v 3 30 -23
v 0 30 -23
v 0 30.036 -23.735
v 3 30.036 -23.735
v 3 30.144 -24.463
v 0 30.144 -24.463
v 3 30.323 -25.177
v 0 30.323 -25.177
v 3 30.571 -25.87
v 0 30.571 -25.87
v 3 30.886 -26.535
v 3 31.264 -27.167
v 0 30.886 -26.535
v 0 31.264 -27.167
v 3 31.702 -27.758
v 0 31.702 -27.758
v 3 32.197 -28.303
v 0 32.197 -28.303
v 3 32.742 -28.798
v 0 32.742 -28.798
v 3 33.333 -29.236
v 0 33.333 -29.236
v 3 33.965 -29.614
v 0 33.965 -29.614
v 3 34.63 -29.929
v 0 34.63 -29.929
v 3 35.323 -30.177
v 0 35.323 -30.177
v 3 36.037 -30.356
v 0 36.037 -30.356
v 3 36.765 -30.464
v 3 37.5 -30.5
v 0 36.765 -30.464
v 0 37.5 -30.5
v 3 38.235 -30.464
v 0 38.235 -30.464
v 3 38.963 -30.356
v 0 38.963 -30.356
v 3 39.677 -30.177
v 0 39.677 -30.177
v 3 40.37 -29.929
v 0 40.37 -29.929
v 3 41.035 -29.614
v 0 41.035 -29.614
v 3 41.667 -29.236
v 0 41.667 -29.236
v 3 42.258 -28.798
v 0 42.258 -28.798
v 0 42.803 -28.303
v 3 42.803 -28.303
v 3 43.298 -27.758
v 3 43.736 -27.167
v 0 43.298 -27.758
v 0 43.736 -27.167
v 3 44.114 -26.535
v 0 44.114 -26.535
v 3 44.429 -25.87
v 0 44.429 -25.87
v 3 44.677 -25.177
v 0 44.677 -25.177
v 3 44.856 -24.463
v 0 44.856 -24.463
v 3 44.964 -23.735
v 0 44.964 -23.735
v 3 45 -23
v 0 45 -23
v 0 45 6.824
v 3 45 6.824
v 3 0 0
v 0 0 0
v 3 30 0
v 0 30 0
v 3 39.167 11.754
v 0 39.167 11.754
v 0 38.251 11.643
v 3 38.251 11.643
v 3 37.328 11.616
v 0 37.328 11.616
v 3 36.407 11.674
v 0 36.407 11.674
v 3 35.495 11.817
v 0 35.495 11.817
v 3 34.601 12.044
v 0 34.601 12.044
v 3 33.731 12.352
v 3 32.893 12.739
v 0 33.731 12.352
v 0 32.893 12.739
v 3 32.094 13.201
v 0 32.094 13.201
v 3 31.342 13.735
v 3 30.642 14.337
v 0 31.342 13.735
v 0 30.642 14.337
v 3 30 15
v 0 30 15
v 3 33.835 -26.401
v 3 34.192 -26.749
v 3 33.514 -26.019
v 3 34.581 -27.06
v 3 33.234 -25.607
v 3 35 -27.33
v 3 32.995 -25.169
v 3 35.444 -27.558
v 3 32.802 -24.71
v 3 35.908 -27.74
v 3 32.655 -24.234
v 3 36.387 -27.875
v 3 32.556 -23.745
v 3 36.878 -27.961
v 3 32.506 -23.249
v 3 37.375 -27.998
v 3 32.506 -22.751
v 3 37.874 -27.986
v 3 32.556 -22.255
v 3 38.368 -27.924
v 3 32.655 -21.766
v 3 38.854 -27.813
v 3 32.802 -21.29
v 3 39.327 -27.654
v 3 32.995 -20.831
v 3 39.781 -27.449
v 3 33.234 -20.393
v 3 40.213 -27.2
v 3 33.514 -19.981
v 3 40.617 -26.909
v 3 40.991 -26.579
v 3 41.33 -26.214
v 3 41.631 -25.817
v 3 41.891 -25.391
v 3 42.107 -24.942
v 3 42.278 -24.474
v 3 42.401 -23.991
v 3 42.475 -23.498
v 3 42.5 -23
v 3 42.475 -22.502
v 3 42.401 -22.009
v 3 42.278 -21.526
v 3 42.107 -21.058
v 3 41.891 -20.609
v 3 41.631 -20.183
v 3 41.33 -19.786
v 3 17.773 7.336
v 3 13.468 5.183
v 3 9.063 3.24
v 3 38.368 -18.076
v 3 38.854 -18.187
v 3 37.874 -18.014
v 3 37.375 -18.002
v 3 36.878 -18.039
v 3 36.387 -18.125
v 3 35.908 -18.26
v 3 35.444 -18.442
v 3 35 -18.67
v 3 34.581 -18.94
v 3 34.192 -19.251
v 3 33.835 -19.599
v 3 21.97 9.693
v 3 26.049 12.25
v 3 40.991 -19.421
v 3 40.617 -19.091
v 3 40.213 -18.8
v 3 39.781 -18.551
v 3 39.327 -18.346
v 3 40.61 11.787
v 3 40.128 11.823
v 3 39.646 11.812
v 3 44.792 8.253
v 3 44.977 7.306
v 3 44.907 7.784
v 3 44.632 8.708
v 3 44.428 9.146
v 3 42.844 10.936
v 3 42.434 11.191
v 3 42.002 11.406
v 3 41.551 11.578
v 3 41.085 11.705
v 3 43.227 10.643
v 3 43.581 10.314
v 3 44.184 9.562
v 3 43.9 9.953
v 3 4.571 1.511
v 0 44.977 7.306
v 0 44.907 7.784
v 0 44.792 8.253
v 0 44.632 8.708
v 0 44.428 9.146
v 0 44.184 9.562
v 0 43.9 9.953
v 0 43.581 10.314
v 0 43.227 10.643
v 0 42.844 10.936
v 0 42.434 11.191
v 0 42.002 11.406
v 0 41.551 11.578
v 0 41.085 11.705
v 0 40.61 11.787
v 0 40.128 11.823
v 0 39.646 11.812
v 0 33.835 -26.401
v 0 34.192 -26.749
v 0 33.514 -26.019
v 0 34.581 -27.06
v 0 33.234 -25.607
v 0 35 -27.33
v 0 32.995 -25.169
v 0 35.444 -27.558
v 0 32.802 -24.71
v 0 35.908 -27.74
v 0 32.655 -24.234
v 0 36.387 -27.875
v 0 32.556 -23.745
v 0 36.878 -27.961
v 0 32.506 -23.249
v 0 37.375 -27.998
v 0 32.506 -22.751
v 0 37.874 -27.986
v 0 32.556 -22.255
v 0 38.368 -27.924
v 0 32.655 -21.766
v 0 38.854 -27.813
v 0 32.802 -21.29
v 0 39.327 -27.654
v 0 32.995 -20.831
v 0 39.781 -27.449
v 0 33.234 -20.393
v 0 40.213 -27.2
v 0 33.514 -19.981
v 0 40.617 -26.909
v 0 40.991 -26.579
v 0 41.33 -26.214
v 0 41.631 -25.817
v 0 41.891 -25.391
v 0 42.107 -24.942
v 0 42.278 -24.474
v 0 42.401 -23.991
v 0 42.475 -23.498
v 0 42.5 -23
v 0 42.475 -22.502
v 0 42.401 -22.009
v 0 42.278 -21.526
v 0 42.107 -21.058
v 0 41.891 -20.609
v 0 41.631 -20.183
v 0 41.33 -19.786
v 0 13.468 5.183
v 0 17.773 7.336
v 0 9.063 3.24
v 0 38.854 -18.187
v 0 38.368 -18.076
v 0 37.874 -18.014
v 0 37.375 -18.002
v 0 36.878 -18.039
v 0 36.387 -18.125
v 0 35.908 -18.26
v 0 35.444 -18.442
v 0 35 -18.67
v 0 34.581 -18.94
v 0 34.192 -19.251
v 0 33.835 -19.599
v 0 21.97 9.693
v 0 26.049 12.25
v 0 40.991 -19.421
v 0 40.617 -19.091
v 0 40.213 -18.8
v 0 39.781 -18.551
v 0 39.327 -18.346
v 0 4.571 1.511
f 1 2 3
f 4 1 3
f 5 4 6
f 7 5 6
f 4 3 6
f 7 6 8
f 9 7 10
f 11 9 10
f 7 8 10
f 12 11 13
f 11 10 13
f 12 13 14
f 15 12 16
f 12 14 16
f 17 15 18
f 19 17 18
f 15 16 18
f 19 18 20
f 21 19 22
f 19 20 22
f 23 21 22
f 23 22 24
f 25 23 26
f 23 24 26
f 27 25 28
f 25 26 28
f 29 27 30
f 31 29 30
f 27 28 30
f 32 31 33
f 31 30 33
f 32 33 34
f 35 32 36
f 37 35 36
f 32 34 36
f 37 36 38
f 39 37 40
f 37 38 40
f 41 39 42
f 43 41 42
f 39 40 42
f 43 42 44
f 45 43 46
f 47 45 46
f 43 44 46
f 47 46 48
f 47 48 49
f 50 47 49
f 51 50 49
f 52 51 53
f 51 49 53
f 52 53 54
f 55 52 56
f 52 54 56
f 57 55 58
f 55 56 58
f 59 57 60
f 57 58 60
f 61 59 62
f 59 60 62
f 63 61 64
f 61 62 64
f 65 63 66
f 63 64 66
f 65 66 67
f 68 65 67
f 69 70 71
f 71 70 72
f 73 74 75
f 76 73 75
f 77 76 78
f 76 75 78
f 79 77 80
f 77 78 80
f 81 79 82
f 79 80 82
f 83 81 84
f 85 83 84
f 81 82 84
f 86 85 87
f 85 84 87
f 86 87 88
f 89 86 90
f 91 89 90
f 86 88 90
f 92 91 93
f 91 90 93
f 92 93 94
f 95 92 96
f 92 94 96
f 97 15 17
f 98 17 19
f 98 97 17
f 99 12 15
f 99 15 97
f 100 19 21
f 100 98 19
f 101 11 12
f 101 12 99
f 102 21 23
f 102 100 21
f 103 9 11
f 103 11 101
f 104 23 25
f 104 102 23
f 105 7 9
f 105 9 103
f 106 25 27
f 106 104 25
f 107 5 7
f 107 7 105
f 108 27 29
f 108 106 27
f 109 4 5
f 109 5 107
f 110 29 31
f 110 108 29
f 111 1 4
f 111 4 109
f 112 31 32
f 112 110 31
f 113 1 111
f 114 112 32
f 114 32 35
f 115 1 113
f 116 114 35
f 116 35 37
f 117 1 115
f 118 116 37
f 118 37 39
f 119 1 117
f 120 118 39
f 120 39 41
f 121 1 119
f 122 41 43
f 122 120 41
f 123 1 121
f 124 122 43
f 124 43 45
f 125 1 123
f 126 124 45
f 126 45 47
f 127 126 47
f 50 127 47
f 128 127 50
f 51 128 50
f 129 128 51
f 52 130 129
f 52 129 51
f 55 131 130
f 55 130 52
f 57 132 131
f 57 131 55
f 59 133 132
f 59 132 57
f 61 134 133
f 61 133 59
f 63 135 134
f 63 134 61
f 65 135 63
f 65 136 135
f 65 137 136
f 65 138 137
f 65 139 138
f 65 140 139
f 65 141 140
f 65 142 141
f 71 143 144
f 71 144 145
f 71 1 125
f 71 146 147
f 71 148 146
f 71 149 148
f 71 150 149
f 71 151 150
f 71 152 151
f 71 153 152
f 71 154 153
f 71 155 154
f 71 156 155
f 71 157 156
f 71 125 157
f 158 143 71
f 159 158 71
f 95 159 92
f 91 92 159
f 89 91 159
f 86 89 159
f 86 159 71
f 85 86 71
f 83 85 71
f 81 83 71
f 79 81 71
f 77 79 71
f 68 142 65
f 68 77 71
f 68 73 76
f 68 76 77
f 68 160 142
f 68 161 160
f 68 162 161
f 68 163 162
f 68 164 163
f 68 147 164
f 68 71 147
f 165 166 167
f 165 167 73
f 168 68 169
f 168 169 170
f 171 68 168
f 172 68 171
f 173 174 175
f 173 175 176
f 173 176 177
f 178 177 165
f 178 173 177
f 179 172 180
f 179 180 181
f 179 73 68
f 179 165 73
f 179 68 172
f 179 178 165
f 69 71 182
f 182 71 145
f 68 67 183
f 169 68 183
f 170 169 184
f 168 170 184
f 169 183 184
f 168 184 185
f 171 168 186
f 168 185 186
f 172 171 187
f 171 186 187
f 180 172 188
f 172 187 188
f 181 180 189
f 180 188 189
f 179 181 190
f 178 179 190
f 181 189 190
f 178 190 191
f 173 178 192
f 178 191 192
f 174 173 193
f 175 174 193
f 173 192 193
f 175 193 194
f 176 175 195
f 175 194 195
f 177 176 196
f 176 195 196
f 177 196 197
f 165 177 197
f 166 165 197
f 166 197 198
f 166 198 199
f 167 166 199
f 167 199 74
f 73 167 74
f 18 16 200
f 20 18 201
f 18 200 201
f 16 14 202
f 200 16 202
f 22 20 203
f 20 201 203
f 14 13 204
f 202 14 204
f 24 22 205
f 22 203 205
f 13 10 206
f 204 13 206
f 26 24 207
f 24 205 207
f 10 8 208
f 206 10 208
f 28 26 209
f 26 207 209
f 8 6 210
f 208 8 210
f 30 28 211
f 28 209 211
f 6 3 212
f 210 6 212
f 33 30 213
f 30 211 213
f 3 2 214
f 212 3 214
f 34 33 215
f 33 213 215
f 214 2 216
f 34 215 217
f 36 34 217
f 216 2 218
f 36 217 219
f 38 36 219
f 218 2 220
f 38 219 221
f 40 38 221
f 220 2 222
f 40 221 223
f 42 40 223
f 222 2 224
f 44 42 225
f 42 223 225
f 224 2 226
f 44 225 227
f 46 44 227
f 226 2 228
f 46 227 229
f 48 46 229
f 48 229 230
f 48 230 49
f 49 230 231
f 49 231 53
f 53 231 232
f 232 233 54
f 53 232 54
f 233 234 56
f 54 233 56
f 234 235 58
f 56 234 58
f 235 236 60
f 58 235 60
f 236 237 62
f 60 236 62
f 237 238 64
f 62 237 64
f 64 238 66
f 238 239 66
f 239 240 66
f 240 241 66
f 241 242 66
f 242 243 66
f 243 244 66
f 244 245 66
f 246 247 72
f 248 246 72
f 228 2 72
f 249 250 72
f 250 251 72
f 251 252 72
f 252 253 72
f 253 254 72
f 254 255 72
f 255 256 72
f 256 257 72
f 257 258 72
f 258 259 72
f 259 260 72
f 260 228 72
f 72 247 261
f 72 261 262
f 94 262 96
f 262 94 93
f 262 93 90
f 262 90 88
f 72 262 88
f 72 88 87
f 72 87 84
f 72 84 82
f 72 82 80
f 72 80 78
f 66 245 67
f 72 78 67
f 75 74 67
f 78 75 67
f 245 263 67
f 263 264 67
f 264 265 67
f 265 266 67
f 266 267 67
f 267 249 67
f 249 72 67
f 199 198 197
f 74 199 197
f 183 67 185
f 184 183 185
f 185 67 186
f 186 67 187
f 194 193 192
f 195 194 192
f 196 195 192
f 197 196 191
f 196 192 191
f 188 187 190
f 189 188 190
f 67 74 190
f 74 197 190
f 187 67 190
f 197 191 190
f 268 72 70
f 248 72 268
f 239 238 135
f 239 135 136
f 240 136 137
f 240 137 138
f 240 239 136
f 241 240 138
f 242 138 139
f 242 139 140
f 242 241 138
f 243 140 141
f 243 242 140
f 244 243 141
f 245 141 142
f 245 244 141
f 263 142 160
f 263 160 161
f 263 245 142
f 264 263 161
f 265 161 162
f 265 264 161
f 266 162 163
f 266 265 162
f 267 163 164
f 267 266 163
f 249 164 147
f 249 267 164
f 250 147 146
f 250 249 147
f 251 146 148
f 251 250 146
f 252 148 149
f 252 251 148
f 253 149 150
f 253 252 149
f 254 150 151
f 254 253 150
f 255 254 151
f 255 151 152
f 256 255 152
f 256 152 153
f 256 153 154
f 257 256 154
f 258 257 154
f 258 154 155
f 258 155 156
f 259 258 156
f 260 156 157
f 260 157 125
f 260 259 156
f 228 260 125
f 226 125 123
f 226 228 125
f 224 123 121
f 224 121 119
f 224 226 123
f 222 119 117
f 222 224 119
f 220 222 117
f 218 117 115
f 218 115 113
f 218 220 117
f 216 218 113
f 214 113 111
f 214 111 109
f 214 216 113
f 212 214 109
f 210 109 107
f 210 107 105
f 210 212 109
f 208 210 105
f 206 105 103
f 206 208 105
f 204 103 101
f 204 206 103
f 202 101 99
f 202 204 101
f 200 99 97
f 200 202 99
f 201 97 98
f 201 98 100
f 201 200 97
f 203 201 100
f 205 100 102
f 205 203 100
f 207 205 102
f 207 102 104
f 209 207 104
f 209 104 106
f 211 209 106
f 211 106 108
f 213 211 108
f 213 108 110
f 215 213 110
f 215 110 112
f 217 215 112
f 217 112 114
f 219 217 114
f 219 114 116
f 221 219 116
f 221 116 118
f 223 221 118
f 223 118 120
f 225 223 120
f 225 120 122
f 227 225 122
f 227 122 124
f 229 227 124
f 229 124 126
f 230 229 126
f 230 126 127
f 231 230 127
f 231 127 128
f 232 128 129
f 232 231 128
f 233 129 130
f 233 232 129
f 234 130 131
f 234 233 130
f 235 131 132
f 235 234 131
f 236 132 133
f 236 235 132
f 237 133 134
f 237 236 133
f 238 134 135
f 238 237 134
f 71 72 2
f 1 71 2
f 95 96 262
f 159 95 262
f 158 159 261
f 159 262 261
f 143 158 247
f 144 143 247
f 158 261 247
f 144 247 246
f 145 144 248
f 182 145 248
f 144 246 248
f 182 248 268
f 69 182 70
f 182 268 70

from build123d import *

# Parameters (mm, degrees)
F0_R     = 5
F1_DEPTH = 3


with BuildPart() as f1:
    # F0 (on Right) → F1 (new body)
    with BuildSketch(Plane.YZ):
        with BuildLine():
            ThreePointArc((30, 15), (15.633379, 6.233241), (0, 0))
            Line((0, 0), (30, 0))
            Line((30, 0), (30, -23))
            ThreePointArc((30, -23), (37.5, -30.5), (45, -23))
            Line((45, -23), (45, 6.824179))
            ThreePointArc((45, 6.824179), (43.227486, 10.642992), (39.166667, 11.754245))
            ThreePointArc((39.166667, 11.754245), (34.162235, 12.187856), (30, 15))
        make_face()
        with Locations((37.5, -23)):
            Circle(F0_R, mode=Mode.SUBTRACT)
    extrude(amount=F1_DEPTH)


solid = f1.part
